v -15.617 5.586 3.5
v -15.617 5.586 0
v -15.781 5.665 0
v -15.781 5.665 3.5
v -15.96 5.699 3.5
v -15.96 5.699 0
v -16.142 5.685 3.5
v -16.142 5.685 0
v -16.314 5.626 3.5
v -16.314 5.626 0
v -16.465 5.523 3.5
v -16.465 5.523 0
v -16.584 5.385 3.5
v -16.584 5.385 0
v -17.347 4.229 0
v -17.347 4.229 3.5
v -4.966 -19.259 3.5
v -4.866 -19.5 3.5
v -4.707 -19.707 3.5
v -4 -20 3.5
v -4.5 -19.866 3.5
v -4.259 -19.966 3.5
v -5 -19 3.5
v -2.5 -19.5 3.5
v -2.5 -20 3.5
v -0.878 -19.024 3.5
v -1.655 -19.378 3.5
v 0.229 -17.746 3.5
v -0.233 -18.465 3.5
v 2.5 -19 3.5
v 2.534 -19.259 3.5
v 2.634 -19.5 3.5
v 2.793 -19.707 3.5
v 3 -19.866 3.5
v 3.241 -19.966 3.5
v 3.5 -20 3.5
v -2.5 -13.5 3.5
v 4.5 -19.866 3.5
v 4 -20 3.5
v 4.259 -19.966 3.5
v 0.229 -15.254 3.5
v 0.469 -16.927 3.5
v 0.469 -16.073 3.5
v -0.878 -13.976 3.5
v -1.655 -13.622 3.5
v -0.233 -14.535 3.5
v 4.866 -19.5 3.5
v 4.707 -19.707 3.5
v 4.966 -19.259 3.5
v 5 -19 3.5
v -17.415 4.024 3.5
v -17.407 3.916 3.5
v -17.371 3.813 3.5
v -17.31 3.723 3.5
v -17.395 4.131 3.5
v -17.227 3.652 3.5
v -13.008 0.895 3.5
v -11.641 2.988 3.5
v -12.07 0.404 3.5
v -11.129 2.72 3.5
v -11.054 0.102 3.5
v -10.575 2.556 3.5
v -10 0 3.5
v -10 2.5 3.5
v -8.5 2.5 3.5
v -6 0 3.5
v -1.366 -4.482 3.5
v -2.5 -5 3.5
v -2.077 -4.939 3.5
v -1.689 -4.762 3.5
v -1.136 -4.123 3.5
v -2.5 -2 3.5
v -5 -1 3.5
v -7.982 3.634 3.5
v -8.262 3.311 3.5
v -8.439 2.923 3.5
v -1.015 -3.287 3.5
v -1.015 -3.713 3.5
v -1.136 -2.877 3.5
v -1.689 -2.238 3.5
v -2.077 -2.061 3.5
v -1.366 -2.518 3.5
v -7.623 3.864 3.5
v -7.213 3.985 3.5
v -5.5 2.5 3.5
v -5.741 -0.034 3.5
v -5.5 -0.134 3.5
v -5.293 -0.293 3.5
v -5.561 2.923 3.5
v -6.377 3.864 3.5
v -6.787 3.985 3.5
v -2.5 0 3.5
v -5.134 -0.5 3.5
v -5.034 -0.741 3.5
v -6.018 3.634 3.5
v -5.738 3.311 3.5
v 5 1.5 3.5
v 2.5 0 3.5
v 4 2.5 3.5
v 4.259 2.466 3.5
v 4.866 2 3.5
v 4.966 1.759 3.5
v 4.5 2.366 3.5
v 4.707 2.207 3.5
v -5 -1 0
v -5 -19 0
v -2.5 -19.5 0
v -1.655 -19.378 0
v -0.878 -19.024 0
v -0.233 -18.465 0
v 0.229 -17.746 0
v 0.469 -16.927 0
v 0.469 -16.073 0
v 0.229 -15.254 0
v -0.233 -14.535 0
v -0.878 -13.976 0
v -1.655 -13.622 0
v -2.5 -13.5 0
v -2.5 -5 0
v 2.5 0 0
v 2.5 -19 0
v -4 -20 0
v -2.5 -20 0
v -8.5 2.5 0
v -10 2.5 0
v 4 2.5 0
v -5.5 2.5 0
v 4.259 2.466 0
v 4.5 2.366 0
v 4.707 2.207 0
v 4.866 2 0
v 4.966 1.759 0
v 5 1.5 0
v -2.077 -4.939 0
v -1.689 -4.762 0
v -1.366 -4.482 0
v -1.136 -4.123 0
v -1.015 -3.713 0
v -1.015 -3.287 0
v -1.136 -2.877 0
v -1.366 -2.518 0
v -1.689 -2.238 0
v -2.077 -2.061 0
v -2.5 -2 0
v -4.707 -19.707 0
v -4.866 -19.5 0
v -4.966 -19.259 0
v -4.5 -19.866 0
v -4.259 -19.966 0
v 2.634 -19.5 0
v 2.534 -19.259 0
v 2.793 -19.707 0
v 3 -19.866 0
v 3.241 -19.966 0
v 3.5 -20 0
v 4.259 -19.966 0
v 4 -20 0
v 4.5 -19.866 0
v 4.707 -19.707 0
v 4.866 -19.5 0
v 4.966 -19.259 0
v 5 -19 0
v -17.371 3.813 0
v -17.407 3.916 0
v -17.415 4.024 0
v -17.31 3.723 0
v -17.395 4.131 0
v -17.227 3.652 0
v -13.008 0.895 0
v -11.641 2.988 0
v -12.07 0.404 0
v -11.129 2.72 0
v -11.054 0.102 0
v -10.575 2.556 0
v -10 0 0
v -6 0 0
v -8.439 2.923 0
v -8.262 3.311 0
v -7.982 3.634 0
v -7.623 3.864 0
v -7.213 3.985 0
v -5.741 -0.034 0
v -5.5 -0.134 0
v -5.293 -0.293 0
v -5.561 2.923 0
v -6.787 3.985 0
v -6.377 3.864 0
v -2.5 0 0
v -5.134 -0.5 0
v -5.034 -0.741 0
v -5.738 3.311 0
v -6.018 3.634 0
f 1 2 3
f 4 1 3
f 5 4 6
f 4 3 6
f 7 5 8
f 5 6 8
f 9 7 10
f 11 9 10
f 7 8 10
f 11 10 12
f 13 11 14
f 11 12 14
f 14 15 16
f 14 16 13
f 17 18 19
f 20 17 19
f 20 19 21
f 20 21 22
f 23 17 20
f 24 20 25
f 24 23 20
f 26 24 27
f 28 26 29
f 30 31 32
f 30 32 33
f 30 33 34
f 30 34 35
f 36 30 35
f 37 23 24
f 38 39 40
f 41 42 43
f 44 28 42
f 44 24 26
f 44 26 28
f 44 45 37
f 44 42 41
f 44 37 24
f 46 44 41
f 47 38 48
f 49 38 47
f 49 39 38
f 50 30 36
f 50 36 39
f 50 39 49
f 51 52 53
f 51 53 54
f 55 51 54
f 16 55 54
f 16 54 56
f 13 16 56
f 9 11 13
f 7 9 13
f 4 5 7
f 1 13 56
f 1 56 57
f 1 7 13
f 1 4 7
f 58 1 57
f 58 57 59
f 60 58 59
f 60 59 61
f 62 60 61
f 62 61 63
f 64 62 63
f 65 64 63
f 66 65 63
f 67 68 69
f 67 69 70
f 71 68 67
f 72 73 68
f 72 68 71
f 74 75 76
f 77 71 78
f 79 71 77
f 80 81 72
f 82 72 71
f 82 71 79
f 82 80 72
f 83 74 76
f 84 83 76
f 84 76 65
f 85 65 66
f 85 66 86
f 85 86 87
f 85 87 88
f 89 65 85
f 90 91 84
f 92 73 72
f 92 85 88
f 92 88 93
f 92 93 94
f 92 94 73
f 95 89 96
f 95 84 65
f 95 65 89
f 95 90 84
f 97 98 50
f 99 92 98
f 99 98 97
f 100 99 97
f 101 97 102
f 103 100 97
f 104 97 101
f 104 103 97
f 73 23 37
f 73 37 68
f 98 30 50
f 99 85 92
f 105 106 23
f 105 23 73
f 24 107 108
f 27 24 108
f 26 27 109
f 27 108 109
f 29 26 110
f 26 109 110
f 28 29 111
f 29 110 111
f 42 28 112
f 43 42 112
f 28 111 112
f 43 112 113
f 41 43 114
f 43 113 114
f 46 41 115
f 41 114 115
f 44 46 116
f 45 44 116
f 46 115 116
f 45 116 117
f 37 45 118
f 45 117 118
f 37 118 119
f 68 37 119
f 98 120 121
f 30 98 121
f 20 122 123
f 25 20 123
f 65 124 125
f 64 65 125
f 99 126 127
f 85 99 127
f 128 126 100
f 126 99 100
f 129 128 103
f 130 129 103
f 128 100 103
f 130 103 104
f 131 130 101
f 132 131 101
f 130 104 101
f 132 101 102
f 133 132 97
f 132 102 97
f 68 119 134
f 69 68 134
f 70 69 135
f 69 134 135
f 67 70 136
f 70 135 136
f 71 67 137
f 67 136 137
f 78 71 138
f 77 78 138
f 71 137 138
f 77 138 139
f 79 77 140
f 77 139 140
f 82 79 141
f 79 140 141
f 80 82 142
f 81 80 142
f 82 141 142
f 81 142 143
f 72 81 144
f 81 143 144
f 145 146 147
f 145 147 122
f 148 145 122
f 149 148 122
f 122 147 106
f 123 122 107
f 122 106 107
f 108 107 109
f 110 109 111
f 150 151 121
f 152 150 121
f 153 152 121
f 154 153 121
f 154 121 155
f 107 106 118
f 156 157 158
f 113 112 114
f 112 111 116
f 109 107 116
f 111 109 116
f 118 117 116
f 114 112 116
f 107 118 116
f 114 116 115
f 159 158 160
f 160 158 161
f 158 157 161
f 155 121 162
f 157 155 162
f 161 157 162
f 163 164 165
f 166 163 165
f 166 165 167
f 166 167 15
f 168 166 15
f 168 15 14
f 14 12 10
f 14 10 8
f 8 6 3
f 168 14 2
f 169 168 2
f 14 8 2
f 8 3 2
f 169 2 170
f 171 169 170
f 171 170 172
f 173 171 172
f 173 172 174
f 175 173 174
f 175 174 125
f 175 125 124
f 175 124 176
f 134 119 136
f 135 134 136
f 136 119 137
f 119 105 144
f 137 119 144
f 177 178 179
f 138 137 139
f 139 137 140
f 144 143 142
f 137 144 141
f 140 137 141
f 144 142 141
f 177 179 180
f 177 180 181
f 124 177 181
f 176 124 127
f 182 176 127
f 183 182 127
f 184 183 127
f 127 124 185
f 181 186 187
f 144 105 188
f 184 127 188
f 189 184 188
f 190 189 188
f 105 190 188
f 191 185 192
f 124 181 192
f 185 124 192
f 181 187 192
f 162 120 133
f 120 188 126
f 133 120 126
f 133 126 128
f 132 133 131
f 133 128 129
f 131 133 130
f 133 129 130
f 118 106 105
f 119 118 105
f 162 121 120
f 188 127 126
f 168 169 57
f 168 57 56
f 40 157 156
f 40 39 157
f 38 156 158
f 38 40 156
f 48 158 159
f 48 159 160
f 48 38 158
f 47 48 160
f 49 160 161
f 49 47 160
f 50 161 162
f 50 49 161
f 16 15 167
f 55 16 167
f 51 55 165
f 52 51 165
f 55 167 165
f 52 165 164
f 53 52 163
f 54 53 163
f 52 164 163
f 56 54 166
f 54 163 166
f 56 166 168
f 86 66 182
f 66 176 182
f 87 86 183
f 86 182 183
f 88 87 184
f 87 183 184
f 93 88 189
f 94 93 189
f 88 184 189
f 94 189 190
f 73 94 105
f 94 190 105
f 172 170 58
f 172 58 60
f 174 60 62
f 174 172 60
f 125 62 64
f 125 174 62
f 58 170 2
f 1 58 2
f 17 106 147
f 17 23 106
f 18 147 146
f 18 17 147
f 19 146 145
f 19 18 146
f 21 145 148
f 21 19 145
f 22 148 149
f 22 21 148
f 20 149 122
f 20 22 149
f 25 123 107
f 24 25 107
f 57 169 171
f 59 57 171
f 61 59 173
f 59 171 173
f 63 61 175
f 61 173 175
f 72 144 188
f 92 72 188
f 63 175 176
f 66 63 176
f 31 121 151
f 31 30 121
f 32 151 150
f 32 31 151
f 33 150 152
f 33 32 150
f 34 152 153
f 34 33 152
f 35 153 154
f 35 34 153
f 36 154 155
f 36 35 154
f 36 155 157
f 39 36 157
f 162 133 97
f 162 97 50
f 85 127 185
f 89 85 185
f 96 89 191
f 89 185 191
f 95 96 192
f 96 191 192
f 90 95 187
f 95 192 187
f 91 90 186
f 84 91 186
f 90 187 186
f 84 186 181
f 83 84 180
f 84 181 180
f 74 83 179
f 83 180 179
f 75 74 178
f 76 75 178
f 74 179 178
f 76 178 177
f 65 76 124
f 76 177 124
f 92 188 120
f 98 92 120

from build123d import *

# Parameters (mm, degrees)
PAD_DEPTH    = 3.5
PAD001_DEPTH = 3.5
FILLET_R     = 1
FILLET001_R  = 1


with BuildPart() as part:
    # Sketch → Pad (new body)
    with BuildSketch(Plane.XY):
        with BuildLine():
            Line((-2.5, 0), (2.5, 0))
            Line((2.5, 0), (2.5, -20))
            Line((2.5, -20), (5, -20))
            Line((5, 2.5), (5, -20))
            Line((-5, 2.5), (5, 2.5))
            Line((-5, -20), (-5, 2.5))
            Line((-5, -20), (-2.5, -20))
            Line((-2.5, -20), (-2.5, -19.5))
            ThreePointArc((-2.5, -19.5), (0.5, -16.5), (-2.5, -13.5))
            Line((-2.5, -13.5), (-2.5, -5))
            ThreePointArc((-2.5, -5), (-1, -3.5), (-2.5, -2))
            Line((-2.5, -2), (-2.5, 0))
        make_face()
    extrude(amount=PAD_DEPTH)

    # Sketch001 → Pad001 (join)
    with BuildSketch(Plane.XY):
        with BuildLine():
            Line((-10, 0), (0, 0))
            Line((0, 0), (0, 2.5))
            Line((0, 2.5), (-5.5, 2.5))
            ThreePointArc((-5.5, 2.5), (-7, 4), (-8.5, 2.5))
            Line((-8.5, 2.5), (-9.999981, 2.5))
            ThreePointArc((-11.640701, 2.988407), (-10.855917, 2.62469), (-9.999981, 2.5))
            Line((-11.640701, 2.988407), (-15.61717, 5.586038))
            ThreePointArc((-15.61717, 5.586038), (-16.142156, 5.685413), (-16.584319, 5.38545))
            Line((-17.34717, 4.229013), (-16.584319, 5.38545))
            ThreePointArc((-17.34717, 4.229013), (-17.407235, 3.915539), (-17.227457, 3.651808))
            Line((-13.007951, 0.895412), (-17.227457, 3.651808))
            ThreePointArc((-13.007951, 0.895412), (-11.569198, 0.228604), (-10, 0))
        make_face()
    extrude(amount=PAD001_DEPTH)

    # Fillet
    fillet_edges = [part.edges().sort_by_distance(p)[0] for p in [
        (-5, 0, 1.75),
    ]]
    fillet(fillet_edges, radius=FILLET_R)

    # Fillet001
    fillet001_edges = [part.edges().sort_by_distance(p)[0] for p in [
        (5, 2.5, 1.75),
        (5, -20, 1.75),
        (2.5, -20, 1.75),
        (-5, -20, 1.75),
    ]]
    fillet(fillet001_edges, radius=FILLET001_R)


solid = part.part
